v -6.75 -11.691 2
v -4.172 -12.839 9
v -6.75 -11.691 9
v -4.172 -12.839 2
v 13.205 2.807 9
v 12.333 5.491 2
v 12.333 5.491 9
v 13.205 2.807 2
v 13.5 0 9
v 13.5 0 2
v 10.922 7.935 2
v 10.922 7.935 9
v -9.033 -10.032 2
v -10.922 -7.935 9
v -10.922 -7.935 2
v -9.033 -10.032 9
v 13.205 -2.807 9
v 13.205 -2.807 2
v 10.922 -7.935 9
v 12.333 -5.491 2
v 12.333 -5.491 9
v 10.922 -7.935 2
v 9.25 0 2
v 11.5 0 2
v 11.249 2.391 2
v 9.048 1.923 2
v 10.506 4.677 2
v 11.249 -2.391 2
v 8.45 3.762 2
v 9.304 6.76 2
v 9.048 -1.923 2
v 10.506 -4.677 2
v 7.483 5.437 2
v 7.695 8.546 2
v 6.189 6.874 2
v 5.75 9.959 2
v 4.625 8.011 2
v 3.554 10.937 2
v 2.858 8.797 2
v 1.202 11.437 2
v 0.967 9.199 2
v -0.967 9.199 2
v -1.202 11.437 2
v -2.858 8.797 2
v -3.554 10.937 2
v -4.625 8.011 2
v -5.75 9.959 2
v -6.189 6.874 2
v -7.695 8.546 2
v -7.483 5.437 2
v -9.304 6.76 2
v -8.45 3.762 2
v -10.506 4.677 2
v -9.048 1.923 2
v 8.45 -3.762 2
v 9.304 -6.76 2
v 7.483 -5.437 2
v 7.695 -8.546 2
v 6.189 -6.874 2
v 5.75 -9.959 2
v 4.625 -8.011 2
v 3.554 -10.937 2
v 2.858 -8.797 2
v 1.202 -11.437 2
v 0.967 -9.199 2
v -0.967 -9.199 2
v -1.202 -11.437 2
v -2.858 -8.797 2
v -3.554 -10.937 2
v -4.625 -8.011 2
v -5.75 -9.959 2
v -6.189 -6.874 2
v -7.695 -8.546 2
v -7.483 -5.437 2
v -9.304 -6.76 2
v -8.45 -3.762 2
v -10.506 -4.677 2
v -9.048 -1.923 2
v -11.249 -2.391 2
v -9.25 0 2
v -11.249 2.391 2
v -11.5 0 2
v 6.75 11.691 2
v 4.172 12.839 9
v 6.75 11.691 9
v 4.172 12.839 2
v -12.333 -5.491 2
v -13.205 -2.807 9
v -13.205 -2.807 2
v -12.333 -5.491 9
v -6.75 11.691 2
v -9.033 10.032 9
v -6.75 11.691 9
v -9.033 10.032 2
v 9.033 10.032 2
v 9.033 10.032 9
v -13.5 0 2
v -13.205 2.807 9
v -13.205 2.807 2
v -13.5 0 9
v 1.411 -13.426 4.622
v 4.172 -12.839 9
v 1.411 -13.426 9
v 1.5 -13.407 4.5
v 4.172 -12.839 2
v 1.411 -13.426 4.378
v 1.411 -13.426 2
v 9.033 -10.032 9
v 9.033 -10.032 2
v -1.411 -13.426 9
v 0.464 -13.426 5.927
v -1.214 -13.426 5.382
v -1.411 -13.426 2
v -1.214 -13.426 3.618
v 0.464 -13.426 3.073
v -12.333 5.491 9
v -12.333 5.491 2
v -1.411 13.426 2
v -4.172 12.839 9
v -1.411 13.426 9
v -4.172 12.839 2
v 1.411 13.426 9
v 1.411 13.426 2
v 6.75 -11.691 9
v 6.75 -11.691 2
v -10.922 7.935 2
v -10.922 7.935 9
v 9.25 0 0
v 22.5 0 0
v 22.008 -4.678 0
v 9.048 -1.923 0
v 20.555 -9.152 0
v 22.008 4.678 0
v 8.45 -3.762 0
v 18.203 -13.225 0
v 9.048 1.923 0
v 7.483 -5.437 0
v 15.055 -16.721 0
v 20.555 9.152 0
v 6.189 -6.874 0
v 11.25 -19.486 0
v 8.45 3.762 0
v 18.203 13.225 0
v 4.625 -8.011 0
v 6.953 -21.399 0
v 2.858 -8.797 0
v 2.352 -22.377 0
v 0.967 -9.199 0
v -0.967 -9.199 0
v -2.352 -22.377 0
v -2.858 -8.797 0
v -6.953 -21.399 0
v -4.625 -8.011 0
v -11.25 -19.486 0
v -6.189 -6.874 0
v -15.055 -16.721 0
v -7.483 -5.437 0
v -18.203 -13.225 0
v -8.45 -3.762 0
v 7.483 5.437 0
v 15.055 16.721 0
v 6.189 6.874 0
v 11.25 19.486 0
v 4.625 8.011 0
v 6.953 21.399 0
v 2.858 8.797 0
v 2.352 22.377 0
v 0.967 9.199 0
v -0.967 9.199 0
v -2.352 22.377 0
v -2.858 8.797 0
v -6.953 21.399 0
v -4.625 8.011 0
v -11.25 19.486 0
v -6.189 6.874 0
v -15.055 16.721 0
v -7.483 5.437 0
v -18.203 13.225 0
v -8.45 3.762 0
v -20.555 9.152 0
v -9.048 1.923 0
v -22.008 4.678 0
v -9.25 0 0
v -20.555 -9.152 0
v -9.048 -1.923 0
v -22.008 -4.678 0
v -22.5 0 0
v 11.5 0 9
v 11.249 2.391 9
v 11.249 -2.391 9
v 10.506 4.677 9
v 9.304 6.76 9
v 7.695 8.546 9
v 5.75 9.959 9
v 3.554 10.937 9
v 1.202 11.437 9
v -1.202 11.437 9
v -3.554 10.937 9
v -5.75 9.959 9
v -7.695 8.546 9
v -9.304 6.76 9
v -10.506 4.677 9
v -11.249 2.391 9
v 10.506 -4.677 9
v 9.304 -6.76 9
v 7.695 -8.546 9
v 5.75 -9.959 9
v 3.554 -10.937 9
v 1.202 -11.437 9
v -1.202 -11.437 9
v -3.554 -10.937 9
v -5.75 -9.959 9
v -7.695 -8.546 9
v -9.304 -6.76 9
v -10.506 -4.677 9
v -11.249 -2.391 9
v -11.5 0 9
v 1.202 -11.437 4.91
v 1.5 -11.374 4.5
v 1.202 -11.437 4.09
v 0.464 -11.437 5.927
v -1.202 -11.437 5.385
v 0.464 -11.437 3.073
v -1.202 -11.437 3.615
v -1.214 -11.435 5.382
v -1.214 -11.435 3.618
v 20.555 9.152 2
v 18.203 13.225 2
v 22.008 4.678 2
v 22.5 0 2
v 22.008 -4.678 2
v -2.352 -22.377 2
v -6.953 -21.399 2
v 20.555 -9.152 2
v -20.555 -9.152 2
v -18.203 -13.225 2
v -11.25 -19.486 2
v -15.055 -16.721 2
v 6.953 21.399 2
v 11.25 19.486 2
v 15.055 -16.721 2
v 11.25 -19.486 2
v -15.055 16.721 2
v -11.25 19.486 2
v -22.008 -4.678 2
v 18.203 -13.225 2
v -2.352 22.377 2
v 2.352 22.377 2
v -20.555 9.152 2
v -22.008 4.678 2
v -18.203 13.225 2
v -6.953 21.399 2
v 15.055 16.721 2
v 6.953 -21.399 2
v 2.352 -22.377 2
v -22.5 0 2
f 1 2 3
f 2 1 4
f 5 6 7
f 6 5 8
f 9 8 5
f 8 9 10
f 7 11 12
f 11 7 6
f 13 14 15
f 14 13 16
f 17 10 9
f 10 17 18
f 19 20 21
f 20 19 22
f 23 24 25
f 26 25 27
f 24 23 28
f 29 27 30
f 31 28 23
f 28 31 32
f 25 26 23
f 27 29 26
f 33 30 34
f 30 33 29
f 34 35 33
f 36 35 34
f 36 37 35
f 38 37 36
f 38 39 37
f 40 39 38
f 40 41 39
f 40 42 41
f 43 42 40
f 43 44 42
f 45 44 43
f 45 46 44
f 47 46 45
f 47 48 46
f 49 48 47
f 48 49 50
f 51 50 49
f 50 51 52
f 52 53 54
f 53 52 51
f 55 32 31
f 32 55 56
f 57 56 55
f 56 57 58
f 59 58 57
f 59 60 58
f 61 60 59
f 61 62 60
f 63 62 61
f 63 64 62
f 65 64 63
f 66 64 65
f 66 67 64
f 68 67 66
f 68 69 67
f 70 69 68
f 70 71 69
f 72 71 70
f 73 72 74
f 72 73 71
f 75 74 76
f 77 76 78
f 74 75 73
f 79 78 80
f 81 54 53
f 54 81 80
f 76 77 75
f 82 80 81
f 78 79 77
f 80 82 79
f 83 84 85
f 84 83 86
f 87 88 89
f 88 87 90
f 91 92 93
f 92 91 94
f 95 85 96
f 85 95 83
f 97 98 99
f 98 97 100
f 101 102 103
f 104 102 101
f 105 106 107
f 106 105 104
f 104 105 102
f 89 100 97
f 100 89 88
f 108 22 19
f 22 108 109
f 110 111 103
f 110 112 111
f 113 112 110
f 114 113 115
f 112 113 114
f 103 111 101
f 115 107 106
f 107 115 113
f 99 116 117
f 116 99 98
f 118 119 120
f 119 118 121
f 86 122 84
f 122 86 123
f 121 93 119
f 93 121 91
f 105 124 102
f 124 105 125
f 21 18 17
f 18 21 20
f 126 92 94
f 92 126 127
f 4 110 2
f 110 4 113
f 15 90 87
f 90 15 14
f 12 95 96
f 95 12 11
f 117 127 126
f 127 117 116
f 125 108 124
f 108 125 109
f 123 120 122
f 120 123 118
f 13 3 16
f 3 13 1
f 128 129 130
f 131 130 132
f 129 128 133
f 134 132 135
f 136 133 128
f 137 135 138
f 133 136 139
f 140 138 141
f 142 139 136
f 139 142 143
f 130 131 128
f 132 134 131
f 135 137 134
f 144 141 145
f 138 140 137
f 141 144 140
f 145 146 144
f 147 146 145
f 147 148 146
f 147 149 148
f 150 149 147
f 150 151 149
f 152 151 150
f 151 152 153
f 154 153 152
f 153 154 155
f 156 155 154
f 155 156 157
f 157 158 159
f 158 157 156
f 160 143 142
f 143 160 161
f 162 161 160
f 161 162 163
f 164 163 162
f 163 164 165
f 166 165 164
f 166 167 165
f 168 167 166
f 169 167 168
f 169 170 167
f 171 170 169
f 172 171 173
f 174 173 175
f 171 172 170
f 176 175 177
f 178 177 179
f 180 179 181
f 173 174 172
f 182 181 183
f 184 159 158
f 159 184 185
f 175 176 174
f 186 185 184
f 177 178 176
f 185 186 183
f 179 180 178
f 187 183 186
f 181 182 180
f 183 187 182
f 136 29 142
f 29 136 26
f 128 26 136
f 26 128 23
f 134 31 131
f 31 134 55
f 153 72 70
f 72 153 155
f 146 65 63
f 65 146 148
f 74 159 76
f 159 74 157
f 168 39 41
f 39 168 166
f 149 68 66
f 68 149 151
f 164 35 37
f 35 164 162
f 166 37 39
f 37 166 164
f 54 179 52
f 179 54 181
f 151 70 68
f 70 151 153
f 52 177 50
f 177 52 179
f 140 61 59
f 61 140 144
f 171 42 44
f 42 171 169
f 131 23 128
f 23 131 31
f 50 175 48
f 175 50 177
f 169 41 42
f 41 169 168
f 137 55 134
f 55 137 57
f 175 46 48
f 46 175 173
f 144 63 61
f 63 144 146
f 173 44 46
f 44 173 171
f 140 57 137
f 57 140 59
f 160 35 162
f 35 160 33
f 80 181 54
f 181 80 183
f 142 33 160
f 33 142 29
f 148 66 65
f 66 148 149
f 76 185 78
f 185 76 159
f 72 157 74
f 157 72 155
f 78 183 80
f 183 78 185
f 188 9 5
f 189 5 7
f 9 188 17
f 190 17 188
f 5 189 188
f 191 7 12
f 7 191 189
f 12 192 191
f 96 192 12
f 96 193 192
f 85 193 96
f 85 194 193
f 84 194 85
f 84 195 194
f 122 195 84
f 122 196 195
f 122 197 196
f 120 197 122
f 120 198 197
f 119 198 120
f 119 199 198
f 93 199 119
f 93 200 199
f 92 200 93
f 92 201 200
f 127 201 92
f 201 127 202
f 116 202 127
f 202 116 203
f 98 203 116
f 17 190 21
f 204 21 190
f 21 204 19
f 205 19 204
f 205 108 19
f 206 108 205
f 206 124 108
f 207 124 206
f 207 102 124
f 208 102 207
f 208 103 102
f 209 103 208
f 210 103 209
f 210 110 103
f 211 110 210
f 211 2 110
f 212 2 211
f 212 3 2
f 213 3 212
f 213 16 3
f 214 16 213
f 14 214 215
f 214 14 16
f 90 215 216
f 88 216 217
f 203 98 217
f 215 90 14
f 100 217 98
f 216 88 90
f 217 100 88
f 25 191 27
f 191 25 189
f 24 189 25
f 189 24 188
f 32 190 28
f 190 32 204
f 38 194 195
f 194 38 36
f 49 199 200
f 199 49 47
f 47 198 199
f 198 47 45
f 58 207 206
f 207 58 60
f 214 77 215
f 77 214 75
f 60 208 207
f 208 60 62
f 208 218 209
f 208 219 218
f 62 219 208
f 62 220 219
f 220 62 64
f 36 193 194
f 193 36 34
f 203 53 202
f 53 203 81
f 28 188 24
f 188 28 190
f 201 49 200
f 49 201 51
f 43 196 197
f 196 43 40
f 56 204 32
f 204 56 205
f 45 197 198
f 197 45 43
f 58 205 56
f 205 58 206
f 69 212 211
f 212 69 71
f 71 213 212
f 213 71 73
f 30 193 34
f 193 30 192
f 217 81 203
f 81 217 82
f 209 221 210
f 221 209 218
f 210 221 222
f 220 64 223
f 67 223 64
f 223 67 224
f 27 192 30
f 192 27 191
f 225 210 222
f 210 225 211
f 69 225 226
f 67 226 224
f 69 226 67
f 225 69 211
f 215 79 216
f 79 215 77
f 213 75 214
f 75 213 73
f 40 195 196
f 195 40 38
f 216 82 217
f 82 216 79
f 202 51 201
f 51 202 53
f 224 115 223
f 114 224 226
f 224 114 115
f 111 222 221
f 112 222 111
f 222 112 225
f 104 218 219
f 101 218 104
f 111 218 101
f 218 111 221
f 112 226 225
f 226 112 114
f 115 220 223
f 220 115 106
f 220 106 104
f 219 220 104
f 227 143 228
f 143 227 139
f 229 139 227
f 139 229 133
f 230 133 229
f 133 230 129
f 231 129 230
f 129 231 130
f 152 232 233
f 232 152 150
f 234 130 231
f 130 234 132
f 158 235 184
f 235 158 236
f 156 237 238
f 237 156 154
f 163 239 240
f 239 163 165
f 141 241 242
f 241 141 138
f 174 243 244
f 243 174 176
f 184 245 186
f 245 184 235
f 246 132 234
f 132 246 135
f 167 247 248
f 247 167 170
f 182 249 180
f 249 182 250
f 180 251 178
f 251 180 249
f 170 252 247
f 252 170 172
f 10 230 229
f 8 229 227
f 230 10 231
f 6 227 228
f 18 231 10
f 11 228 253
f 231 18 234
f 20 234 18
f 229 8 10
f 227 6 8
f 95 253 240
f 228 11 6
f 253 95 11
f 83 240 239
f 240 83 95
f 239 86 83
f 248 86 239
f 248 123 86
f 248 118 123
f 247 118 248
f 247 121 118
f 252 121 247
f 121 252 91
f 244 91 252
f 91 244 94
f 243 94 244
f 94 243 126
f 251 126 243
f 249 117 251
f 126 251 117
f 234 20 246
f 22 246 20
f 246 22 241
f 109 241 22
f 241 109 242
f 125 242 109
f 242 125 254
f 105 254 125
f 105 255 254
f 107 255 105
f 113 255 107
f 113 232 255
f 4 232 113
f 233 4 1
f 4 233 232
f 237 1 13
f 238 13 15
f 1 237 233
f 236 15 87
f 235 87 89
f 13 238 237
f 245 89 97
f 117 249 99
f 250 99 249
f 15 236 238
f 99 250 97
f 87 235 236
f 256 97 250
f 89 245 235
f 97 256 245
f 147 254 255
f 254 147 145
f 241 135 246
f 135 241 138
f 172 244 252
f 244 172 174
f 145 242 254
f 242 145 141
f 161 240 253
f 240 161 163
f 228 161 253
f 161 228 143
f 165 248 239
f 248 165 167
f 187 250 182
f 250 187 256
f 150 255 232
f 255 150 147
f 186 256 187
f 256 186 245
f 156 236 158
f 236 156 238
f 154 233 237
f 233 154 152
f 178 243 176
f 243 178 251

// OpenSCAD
union() {
	difference() {
		union() {
			difference() {
				cylinder(d = 27, h = 2);
				translate(v = [0, 0, -1.0000000000]) {
					cylinder(d = 18.5000000000, h = 4);
				}
			}
			difference() {
				cylinder(d = 27, h = 9);
				translate(v = [0, 0, -4.5000000000]) {
					cylinder(d = 23, h = 18);
				}
			}
		}
		translate(v = [0, 0, 4.5000000000]) {
			rotate(a = [90, 0, 0]) {
				cylinder(d = 3, h = 30);
			}
		}
	}
	difference() {
		cylinder(d = 45, h = 2);
		translate(v = [0, 0, -1.0000000000]) {
			cylinder(d = 27, h = 4);
		}
	}
}
